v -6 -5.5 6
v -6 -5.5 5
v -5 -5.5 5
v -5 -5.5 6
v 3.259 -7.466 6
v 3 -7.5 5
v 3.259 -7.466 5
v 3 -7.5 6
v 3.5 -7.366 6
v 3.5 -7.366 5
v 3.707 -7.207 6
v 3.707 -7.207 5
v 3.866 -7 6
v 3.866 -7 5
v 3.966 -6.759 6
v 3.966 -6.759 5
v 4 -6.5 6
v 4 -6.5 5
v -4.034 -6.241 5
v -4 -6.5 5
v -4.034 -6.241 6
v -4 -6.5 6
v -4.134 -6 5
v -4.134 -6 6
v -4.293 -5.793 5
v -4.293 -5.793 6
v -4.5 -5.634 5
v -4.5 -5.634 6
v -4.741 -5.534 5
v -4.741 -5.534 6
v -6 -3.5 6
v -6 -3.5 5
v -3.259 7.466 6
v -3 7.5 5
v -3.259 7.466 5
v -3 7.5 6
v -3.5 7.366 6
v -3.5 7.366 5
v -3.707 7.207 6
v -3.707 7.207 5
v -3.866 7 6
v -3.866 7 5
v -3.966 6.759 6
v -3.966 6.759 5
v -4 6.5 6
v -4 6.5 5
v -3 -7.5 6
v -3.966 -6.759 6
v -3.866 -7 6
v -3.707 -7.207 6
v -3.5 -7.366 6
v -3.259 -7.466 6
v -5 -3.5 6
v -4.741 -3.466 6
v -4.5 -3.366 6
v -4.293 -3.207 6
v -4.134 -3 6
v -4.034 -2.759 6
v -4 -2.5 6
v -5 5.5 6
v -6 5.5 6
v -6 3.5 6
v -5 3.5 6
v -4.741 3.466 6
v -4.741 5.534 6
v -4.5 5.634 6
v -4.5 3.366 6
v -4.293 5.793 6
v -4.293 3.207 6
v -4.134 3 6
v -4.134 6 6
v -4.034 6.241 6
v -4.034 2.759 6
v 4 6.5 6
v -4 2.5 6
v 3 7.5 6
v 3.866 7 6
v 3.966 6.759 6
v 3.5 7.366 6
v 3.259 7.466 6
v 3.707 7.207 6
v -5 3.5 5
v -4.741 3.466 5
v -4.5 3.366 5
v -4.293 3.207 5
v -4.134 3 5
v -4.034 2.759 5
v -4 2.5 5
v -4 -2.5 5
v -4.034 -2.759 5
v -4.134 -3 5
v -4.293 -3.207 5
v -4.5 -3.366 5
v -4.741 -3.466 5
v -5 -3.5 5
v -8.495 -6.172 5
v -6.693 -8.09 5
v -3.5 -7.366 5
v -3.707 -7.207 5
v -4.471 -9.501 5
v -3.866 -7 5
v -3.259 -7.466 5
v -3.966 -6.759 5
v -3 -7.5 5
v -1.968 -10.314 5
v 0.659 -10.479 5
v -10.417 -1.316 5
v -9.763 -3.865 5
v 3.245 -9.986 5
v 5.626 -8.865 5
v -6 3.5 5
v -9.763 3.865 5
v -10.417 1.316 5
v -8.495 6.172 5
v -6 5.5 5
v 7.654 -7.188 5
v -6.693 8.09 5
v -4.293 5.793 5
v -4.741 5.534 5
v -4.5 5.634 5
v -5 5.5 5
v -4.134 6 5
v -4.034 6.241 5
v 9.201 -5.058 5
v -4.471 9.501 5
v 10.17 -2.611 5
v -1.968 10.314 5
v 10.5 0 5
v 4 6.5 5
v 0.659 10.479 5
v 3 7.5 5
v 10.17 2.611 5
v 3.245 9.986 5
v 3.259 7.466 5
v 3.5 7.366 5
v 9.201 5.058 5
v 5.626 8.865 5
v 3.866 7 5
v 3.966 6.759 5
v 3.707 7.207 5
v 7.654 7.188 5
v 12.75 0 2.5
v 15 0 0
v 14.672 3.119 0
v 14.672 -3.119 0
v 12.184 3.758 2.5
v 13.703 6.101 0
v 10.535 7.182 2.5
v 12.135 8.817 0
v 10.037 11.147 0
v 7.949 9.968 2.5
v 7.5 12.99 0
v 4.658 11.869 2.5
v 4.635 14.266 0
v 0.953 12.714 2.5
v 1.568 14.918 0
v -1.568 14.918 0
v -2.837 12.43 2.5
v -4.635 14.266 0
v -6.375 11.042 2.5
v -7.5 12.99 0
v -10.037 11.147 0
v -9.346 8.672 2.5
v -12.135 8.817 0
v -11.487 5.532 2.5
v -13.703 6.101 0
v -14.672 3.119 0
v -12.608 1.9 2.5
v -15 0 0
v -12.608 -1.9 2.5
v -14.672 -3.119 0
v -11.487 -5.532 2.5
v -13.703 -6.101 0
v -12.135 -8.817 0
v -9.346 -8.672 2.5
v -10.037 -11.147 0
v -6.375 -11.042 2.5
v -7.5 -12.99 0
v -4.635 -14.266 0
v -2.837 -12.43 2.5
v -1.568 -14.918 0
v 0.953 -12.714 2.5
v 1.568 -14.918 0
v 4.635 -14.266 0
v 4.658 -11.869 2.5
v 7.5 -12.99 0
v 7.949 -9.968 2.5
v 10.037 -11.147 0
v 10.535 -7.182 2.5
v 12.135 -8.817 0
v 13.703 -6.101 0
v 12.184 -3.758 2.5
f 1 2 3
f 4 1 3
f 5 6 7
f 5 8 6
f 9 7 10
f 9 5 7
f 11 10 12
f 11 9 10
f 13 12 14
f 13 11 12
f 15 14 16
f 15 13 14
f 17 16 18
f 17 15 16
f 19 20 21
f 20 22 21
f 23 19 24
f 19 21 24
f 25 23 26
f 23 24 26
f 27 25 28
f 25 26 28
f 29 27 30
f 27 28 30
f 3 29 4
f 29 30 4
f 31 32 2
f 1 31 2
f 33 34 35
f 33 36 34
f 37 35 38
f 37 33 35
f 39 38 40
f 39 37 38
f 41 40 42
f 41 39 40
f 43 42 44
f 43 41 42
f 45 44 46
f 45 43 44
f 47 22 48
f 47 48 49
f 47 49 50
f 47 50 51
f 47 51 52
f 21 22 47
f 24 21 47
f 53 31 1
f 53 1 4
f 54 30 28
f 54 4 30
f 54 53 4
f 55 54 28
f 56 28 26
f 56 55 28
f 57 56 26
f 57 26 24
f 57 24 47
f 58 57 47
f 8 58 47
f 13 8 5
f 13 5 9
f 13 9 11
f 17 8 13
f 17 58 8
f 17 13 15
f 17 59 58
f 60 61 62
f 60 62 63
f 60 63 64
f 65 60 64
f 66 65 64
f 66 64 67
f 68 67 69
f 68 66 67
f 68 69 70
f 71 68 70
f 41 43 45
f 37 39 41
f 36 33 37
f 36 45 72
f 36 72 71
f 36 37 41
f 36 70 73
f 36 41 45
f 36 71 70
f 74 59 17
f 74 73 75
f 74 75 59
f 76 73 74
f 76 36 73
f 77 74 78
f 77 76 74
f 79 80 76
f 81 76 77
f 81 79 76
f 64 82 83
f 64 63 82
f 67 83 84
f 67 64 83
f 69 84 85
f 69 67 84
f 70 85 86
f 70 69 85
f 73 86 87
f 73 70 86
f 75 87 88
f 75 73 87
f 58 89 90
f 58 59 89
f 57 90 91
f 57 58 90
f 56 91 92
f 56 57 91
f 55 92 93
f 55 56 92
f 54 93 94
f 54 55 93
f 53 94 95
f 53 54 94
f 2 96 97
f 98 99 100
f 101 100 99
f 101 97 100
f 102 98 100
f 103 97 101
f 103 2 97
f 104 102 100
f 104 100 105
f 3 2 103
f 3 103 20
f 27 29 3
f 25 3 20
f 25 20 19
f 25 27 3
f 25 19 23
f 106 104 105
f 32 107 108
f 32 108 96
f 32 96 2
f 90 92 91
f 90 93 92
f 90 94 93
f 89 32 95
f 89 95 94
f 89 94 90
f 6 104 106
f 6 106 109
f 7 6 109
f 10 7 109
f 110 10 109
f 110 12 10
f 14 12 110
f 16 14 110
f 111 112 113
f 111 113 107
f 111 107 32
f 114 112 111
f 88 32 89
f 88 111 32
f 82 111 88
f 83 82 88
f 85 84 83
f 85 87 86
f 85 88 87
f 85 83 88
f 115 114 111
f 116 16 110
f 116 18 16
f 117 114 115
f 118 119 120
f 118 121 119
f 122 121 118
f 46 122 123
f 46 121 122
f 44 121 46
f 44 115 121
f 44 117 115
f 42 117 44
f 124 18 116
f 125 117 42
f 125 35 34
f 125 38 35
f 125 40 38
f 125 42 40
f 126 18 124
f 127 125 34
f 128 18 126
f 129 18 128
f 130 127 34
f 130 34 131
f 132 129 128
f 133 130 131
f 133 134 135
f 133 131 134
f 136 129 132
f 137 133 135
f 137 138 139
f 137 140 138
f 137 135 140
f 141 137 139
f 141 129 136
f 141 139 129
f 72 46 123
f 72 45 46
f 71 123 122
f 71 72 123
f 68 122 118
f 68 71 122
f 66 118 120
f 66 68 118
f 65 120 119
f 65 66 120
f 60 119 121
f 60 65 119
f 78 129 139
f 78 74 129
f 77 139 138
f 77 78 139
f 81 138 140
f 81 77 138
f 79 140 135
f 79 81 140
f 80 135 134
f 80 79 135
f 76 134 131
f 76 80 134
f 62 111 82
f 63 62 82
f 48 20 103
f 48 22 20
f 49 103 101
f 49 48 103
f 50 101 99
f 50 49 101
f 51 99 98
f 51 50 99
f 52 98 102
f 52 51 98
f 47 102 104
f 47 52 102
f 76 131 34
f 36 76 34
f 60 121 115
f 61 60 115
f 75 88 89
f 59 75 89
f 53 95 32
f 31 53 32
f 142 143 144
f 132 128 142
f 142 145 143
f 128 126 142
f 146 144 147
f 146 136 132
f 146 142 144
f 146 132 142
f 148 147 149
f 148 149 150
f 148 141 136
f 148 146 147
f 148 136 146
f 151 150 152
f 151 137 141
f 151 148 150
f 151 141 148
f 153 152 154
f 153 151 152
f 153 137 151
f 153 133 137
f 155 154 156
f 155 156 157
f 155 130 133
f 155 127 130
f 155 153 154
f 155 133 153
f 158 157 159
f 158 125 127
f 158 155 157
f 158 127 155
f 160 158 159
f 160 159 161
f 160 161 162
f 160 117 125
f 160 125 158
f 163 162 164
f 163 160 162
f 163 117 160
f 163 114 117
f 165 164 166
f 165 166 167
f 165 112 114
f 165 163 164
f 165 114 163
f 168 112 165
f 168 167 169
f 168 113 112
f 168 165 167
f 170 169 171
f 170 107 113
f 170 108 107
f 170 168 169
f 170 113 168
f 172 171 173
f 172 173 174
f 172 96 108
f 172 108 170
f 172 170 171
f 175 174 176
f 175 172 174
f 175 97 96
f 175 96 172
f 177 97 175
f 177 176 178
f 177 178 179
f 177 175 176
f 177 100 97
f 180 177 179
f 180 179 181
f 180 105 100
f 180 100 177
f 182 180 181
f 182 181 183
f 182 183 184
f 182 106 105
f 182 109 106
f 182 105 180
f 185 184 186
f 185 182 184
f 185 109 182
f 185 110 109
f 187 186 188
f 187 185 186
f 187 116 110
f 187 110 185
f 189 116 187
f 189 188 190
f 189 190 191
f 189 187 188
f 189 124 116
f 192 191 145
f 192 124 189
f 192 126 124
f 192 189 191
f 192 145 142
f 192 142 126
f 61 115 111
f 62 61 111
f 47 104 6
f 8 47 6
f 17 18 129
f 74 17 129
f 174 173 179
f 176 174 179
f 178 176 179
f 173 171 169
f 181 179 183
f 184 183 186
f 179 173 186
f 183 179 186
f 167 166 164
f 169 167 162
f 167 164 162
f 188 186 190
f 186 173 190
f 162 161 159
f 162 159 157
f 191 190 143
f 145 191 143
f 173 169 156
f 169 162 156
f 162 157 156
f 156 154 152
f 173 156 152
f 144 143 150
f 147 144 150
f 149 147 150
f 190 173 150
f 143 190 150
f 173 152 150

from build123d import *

# Parameters (mm, degrees)
F0_R     = 15
F2_R     = 10.5
F5_DEPTH = 1
F6_R     = 0.99999


# Not quite as in the source:
# - a fillet or chamfer is up to 0.001 mm smaller than in the source, because OpenCascade refuses the exact size


with BuildPart() as f3:
    # F0 (on Top) → F3 section 0
    with BuildSketch(Plane.XY):
        Circle(F0_R)
    # F2 (on offset) → F3 section 1
    with BuildSketch(Plane.XY.offset(5)):
        Circle(F2_R)
    loft()

    # F4 (on face) → F5 (join)
    with BuildSketch(Plane.XY.offset(5)):
        Polygon((-4, -5.5), (-4, -7.5), (4, -7.5), (4, 7.5), (-4, 7.5), (-4, 5.5), (-6, 5.5), (-6, 3.5), (-4, 3.5), (-4, -3.5), (-6, -3.5), (-6, -5.5), align=None)
    extrude(amount=F5_DEPTH)

    # F6 (radius 1 in the source; OpenCascade refuses exactly that, so slightly less here)
    f6_edges = [f3.edges().sort_by_distance(p)[0] for p in [
        (-4, -7.5, 5.5),
        (4, -7.5, 5.5),
        (4, 7.5, 5.5),
        (-4, 7.5, 5.5),
        (-4, -5.5, 5.5),
        (-4, 3.5, 5.5),
        (-4, -3.5, 5.5),
        (-4, 5.5, 5.5),
    ]]
    fillet(f6_edges, radius=F6_R)


solid = f3.part
